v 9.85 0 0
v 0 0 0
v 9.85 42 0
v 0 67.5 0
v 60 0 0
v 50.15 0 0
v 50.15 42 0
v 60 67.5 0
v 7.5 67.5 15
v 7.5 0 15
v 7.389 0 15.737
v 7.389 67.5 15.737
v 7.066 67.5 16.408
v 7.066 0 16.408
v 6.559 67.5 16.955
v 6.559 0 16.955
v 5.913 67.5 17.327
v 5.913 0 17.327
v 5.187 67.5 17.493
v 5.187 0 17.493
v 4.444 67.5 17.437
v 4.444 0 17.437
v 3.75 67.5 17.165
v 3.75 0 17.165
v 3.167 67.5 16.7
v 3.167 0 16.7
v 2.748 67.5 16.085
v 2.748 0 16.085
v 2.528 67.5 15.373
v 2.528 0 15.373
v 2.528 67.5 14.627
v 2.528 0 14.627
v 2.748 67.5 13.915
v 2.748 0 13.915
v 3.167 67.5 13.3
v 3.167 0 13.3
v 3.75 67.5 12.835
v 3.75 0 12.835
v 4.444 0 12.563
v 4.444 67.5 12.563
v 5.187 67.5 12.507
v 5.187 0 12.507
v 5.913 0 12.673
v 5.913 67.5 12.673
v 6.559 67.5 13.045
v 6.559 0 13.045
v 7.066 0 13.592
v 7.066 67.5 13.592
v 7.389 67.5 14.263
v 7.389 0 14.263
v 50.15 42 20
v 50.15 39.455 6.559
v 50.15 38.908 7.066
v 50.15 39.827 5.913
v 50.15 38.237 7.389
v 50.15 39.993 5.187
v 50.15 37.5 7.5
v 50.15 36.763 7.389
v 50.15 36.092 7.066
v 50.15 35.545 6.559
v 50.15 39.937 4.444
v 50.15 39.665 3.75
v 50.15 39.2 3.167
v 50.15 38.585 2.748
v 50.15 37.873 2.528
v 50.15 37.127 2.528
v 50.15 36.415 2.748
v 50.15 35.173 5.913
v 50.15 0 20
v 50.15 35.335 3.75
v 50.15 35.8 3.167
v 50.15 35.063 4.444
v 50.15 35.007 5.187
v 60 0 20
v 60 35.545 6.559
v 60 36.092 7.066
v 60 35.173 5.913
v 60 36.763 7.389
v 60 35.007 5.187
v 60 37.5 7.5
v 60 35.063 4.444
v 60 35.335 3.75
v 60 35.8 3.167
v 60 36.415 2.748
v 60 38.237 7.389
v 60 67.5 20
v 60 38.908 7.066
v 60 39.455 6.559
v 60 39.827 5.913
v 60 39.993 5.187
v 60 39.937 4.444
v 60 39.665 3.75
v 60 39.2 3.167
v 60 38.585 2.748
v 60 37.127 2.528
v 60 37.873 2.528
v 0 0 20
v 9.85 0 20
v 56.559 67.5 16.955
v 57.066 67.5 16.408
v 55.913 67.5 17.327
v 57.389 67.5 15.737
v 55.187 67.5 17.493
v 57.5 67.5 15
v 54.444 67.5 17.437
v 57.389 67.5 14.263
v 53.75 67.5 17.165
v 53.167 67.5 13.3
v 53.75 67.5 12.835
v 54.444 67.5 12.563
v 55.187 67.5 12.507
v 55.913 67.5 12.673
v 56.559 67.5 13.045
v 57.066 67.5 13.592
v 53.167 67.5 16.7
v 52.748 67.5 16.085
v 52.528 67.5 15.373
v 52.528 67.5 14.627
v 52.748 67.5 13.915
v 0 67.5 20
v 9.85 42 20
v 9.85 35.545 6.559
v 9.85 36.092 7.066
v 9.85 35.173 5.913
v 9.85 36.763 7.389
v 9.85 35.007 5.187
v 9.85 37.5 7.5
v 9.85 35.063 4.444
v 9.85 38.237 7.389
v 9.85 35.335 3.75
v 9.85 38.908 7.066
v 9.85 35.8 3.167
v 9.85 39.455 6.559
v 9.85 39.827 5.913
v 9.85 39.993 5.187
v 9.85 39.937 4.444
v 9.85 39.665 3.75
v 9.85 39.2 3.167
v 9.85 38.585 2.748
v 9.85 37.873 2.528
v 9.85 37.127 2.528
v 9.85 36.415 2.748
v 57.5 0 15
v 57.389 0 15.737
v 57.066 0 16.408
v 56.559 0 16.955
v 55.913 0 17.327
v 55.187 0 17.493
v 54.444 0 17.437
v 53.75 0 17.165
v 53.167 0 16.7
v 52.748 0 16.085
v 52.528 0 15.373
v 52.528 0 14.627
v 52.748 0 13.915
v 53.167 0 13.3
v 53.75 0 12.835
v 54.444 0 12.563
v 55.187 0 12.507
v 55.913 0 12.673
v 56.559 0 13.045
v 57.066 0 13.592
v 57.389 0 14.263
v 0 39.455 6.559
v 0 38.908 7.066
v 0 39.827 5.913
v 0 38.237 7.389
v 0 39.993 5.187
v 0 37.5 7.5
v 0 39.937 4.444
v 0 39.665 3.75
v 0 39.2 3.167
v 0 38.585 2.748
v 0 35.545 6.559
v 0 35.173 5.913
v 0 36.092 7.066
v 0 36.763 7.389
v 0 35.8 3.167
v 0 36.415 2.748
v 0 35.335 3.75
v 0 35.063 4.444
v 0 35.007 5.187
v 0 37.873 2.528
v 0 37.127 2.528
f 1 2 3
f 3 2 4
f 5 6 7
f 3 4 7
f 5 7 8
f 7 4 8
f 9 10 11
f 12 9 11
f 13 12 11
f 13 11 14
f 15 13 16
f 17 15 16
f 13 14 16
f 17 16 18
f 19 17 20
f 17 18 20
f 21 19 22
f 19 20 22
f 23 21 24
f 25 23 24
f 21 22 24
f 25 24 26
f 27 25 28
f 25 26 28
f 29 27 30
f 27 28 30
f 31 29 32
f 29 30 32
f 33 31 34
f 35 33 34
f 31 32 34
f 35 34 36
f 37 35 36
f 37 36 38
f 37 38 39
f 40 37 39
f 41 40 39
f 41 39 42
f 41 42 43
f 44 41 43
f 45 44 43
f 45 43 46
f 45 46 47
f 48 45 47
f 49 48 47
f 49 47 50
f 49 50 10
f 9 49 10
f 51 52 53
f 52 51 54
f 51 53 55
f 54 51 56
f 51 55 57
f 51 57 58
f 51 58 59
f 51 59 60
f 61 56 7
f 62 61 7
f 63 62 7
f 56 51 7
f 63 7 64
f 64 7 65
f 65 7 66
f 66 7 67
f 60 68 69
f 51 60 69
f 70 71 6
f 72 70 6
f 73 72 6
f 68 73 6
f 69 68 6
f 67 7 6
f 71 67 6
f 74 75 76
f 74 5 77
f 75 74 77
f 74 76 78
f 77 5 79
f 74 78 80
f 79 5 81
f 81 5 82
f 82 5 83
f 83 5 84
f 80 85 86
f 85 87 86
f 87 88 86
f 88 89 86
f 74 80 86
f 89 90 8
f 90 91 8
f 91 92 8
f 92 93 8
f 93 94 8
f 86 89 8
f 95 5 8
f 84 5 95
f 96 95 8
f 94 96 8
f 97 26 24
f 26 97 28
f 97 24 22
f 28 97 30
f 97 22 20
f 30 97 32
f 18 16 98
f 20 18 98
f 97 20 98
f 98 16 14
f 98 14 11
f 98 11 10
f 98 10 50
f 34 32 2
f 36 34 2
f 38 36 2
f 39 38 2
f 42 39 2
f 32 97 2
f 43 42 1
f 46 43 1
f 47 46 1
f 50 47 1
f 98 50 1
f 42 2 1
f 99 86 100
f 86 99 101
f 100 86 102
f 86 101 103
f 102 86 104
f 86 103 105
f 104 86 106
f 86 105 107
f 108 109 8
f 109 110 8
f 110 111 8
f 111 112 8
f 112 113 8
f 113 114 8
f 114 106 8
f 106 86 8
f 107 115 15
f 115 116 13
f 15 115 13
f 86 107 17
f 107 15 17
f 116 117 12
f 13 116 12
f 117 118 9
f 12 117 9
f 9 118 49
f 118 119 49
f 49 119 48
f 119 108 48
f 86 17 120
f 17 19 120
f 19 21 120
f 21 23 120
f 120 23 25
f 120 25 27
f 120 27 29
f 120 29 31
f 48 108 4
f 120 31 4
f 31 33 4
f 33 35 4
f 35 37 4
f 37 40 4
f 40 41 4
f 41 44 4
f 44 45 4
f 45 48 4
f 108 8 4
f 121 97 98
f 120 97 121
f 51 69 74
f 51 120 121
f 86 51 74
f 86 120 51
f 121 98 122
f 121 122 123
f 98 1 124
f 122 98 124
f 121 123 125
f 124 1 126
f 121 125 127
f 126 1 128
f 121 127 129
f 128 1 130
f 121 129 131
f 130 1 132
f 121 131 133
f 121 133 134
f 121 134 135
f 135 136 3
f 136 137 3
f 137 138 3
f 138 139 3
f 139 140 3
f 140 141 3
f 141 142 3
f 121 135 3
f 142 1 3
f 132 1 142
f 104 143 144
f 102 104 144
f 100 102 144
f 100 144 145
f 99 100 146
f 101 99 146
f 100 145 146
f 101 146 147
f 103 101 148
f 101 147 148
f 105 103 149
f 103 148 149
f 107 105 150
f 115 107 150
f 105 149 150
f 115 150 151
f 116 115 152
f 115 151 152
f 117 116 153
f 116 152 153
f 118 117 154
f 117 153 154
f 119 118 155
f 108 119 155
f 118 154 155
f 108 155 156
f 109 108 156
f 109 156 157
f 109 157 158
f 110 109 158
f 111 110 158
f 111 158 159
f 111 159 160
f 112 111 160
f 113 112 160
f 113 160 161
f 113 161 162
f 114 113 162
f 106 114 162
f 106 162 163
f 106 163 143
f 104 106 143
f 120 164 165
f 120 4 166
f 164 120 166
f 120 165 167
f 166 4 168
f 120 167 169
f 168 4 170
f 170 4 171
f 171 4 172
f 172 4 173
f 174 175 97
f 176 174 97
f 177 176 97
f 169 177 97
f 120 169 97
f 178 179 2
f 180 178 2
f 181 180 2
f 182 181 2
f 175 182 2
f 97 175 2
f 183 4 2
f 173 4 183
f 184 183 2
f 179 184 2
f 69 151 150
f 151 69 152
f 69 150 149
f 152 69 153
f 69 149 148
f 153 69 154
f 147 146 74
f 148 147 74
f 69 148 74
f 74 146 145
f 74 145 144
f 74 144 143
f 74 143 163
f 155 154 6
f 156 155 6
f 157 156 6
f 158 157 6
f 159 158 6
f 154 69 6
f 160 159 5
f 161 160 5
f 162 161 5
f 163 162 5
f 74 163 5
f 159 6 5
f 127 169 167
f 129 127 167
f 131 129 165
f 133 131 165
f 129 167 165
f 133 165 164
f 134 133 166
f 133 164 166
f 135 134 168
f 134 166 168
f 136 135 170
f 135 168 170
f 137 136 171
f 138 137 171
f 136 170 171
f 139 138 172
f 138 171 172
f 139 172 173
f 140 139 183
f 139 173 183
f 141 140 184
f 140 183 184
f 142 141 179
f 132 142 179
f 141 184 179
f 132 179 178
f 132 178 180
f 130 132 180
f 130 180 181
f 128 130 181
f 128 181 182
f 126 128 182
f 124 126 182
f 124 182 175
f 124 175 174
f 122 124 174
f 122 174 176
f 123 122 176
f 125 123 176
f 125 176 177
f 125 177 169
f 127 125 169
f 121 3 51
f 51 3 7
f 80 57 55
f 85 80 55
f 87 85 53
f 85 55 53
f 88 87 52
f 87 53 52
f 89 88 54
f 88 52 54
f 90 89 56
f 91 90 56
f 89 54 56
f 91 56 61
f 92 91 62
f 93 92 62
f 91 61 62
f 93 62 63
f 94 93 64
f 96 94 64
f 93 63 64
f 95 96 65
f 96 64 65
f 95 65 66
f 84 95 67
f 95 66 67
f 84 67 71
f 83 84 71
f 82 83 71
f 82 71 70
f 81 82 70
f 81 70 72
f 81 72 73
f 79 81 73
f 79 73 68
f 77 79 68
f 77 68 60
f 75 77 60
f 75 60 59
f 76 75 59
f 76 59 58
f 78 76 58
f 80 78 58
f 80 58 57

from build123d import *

# Parameters (mm, degrees)
BOSS_EXTRUDE1_DEPTH = 20
SKETCH3_R           = 2.5
CUT_EXTRUDE1_DEPTH  = 68.5
SKETCH4_R           = 2.5
CUT_EXTRUDE2_DEPTH  = 61


with BuildPart() as part:
    # Sketch1 → Boss-Extrude1 (new body)
    with BuildSketch(Plane.XY):
        Polygon((50.15, 0), (60, 0), (60, 67.5), (0, 67.5), (0, 0), (9.85, 0), (9.85, 42), (50.15, 42), align=None)
    extrude(amount=BOSS_EXTRUDE1_DEPTH)

    # Sketch3 → Cut-Extrude1 (cut, through all)
    with BuildSketch(Plane.XZ):
        with Locations((5, 15)):
            Circle(SKETCH3_R)
        with Locations((55, 15)):
            Circle(SKETCH3_R)
    extrude(amount=-CUT_EXTRUDE1_DEPTH, mode=Mode.SUBTRACT)

    # Sketch4 → Cut-Extrude2 (cut, through all)
    with BuildSketch(Plane.ZY):
        with Locations((5, 37.5)):
            Circle(SKETCH4_R)
    extrude(amount=-CUT_EXTRUDE2_DEPTH, mode=Mode.SUBTRACT)


solid = part.part
